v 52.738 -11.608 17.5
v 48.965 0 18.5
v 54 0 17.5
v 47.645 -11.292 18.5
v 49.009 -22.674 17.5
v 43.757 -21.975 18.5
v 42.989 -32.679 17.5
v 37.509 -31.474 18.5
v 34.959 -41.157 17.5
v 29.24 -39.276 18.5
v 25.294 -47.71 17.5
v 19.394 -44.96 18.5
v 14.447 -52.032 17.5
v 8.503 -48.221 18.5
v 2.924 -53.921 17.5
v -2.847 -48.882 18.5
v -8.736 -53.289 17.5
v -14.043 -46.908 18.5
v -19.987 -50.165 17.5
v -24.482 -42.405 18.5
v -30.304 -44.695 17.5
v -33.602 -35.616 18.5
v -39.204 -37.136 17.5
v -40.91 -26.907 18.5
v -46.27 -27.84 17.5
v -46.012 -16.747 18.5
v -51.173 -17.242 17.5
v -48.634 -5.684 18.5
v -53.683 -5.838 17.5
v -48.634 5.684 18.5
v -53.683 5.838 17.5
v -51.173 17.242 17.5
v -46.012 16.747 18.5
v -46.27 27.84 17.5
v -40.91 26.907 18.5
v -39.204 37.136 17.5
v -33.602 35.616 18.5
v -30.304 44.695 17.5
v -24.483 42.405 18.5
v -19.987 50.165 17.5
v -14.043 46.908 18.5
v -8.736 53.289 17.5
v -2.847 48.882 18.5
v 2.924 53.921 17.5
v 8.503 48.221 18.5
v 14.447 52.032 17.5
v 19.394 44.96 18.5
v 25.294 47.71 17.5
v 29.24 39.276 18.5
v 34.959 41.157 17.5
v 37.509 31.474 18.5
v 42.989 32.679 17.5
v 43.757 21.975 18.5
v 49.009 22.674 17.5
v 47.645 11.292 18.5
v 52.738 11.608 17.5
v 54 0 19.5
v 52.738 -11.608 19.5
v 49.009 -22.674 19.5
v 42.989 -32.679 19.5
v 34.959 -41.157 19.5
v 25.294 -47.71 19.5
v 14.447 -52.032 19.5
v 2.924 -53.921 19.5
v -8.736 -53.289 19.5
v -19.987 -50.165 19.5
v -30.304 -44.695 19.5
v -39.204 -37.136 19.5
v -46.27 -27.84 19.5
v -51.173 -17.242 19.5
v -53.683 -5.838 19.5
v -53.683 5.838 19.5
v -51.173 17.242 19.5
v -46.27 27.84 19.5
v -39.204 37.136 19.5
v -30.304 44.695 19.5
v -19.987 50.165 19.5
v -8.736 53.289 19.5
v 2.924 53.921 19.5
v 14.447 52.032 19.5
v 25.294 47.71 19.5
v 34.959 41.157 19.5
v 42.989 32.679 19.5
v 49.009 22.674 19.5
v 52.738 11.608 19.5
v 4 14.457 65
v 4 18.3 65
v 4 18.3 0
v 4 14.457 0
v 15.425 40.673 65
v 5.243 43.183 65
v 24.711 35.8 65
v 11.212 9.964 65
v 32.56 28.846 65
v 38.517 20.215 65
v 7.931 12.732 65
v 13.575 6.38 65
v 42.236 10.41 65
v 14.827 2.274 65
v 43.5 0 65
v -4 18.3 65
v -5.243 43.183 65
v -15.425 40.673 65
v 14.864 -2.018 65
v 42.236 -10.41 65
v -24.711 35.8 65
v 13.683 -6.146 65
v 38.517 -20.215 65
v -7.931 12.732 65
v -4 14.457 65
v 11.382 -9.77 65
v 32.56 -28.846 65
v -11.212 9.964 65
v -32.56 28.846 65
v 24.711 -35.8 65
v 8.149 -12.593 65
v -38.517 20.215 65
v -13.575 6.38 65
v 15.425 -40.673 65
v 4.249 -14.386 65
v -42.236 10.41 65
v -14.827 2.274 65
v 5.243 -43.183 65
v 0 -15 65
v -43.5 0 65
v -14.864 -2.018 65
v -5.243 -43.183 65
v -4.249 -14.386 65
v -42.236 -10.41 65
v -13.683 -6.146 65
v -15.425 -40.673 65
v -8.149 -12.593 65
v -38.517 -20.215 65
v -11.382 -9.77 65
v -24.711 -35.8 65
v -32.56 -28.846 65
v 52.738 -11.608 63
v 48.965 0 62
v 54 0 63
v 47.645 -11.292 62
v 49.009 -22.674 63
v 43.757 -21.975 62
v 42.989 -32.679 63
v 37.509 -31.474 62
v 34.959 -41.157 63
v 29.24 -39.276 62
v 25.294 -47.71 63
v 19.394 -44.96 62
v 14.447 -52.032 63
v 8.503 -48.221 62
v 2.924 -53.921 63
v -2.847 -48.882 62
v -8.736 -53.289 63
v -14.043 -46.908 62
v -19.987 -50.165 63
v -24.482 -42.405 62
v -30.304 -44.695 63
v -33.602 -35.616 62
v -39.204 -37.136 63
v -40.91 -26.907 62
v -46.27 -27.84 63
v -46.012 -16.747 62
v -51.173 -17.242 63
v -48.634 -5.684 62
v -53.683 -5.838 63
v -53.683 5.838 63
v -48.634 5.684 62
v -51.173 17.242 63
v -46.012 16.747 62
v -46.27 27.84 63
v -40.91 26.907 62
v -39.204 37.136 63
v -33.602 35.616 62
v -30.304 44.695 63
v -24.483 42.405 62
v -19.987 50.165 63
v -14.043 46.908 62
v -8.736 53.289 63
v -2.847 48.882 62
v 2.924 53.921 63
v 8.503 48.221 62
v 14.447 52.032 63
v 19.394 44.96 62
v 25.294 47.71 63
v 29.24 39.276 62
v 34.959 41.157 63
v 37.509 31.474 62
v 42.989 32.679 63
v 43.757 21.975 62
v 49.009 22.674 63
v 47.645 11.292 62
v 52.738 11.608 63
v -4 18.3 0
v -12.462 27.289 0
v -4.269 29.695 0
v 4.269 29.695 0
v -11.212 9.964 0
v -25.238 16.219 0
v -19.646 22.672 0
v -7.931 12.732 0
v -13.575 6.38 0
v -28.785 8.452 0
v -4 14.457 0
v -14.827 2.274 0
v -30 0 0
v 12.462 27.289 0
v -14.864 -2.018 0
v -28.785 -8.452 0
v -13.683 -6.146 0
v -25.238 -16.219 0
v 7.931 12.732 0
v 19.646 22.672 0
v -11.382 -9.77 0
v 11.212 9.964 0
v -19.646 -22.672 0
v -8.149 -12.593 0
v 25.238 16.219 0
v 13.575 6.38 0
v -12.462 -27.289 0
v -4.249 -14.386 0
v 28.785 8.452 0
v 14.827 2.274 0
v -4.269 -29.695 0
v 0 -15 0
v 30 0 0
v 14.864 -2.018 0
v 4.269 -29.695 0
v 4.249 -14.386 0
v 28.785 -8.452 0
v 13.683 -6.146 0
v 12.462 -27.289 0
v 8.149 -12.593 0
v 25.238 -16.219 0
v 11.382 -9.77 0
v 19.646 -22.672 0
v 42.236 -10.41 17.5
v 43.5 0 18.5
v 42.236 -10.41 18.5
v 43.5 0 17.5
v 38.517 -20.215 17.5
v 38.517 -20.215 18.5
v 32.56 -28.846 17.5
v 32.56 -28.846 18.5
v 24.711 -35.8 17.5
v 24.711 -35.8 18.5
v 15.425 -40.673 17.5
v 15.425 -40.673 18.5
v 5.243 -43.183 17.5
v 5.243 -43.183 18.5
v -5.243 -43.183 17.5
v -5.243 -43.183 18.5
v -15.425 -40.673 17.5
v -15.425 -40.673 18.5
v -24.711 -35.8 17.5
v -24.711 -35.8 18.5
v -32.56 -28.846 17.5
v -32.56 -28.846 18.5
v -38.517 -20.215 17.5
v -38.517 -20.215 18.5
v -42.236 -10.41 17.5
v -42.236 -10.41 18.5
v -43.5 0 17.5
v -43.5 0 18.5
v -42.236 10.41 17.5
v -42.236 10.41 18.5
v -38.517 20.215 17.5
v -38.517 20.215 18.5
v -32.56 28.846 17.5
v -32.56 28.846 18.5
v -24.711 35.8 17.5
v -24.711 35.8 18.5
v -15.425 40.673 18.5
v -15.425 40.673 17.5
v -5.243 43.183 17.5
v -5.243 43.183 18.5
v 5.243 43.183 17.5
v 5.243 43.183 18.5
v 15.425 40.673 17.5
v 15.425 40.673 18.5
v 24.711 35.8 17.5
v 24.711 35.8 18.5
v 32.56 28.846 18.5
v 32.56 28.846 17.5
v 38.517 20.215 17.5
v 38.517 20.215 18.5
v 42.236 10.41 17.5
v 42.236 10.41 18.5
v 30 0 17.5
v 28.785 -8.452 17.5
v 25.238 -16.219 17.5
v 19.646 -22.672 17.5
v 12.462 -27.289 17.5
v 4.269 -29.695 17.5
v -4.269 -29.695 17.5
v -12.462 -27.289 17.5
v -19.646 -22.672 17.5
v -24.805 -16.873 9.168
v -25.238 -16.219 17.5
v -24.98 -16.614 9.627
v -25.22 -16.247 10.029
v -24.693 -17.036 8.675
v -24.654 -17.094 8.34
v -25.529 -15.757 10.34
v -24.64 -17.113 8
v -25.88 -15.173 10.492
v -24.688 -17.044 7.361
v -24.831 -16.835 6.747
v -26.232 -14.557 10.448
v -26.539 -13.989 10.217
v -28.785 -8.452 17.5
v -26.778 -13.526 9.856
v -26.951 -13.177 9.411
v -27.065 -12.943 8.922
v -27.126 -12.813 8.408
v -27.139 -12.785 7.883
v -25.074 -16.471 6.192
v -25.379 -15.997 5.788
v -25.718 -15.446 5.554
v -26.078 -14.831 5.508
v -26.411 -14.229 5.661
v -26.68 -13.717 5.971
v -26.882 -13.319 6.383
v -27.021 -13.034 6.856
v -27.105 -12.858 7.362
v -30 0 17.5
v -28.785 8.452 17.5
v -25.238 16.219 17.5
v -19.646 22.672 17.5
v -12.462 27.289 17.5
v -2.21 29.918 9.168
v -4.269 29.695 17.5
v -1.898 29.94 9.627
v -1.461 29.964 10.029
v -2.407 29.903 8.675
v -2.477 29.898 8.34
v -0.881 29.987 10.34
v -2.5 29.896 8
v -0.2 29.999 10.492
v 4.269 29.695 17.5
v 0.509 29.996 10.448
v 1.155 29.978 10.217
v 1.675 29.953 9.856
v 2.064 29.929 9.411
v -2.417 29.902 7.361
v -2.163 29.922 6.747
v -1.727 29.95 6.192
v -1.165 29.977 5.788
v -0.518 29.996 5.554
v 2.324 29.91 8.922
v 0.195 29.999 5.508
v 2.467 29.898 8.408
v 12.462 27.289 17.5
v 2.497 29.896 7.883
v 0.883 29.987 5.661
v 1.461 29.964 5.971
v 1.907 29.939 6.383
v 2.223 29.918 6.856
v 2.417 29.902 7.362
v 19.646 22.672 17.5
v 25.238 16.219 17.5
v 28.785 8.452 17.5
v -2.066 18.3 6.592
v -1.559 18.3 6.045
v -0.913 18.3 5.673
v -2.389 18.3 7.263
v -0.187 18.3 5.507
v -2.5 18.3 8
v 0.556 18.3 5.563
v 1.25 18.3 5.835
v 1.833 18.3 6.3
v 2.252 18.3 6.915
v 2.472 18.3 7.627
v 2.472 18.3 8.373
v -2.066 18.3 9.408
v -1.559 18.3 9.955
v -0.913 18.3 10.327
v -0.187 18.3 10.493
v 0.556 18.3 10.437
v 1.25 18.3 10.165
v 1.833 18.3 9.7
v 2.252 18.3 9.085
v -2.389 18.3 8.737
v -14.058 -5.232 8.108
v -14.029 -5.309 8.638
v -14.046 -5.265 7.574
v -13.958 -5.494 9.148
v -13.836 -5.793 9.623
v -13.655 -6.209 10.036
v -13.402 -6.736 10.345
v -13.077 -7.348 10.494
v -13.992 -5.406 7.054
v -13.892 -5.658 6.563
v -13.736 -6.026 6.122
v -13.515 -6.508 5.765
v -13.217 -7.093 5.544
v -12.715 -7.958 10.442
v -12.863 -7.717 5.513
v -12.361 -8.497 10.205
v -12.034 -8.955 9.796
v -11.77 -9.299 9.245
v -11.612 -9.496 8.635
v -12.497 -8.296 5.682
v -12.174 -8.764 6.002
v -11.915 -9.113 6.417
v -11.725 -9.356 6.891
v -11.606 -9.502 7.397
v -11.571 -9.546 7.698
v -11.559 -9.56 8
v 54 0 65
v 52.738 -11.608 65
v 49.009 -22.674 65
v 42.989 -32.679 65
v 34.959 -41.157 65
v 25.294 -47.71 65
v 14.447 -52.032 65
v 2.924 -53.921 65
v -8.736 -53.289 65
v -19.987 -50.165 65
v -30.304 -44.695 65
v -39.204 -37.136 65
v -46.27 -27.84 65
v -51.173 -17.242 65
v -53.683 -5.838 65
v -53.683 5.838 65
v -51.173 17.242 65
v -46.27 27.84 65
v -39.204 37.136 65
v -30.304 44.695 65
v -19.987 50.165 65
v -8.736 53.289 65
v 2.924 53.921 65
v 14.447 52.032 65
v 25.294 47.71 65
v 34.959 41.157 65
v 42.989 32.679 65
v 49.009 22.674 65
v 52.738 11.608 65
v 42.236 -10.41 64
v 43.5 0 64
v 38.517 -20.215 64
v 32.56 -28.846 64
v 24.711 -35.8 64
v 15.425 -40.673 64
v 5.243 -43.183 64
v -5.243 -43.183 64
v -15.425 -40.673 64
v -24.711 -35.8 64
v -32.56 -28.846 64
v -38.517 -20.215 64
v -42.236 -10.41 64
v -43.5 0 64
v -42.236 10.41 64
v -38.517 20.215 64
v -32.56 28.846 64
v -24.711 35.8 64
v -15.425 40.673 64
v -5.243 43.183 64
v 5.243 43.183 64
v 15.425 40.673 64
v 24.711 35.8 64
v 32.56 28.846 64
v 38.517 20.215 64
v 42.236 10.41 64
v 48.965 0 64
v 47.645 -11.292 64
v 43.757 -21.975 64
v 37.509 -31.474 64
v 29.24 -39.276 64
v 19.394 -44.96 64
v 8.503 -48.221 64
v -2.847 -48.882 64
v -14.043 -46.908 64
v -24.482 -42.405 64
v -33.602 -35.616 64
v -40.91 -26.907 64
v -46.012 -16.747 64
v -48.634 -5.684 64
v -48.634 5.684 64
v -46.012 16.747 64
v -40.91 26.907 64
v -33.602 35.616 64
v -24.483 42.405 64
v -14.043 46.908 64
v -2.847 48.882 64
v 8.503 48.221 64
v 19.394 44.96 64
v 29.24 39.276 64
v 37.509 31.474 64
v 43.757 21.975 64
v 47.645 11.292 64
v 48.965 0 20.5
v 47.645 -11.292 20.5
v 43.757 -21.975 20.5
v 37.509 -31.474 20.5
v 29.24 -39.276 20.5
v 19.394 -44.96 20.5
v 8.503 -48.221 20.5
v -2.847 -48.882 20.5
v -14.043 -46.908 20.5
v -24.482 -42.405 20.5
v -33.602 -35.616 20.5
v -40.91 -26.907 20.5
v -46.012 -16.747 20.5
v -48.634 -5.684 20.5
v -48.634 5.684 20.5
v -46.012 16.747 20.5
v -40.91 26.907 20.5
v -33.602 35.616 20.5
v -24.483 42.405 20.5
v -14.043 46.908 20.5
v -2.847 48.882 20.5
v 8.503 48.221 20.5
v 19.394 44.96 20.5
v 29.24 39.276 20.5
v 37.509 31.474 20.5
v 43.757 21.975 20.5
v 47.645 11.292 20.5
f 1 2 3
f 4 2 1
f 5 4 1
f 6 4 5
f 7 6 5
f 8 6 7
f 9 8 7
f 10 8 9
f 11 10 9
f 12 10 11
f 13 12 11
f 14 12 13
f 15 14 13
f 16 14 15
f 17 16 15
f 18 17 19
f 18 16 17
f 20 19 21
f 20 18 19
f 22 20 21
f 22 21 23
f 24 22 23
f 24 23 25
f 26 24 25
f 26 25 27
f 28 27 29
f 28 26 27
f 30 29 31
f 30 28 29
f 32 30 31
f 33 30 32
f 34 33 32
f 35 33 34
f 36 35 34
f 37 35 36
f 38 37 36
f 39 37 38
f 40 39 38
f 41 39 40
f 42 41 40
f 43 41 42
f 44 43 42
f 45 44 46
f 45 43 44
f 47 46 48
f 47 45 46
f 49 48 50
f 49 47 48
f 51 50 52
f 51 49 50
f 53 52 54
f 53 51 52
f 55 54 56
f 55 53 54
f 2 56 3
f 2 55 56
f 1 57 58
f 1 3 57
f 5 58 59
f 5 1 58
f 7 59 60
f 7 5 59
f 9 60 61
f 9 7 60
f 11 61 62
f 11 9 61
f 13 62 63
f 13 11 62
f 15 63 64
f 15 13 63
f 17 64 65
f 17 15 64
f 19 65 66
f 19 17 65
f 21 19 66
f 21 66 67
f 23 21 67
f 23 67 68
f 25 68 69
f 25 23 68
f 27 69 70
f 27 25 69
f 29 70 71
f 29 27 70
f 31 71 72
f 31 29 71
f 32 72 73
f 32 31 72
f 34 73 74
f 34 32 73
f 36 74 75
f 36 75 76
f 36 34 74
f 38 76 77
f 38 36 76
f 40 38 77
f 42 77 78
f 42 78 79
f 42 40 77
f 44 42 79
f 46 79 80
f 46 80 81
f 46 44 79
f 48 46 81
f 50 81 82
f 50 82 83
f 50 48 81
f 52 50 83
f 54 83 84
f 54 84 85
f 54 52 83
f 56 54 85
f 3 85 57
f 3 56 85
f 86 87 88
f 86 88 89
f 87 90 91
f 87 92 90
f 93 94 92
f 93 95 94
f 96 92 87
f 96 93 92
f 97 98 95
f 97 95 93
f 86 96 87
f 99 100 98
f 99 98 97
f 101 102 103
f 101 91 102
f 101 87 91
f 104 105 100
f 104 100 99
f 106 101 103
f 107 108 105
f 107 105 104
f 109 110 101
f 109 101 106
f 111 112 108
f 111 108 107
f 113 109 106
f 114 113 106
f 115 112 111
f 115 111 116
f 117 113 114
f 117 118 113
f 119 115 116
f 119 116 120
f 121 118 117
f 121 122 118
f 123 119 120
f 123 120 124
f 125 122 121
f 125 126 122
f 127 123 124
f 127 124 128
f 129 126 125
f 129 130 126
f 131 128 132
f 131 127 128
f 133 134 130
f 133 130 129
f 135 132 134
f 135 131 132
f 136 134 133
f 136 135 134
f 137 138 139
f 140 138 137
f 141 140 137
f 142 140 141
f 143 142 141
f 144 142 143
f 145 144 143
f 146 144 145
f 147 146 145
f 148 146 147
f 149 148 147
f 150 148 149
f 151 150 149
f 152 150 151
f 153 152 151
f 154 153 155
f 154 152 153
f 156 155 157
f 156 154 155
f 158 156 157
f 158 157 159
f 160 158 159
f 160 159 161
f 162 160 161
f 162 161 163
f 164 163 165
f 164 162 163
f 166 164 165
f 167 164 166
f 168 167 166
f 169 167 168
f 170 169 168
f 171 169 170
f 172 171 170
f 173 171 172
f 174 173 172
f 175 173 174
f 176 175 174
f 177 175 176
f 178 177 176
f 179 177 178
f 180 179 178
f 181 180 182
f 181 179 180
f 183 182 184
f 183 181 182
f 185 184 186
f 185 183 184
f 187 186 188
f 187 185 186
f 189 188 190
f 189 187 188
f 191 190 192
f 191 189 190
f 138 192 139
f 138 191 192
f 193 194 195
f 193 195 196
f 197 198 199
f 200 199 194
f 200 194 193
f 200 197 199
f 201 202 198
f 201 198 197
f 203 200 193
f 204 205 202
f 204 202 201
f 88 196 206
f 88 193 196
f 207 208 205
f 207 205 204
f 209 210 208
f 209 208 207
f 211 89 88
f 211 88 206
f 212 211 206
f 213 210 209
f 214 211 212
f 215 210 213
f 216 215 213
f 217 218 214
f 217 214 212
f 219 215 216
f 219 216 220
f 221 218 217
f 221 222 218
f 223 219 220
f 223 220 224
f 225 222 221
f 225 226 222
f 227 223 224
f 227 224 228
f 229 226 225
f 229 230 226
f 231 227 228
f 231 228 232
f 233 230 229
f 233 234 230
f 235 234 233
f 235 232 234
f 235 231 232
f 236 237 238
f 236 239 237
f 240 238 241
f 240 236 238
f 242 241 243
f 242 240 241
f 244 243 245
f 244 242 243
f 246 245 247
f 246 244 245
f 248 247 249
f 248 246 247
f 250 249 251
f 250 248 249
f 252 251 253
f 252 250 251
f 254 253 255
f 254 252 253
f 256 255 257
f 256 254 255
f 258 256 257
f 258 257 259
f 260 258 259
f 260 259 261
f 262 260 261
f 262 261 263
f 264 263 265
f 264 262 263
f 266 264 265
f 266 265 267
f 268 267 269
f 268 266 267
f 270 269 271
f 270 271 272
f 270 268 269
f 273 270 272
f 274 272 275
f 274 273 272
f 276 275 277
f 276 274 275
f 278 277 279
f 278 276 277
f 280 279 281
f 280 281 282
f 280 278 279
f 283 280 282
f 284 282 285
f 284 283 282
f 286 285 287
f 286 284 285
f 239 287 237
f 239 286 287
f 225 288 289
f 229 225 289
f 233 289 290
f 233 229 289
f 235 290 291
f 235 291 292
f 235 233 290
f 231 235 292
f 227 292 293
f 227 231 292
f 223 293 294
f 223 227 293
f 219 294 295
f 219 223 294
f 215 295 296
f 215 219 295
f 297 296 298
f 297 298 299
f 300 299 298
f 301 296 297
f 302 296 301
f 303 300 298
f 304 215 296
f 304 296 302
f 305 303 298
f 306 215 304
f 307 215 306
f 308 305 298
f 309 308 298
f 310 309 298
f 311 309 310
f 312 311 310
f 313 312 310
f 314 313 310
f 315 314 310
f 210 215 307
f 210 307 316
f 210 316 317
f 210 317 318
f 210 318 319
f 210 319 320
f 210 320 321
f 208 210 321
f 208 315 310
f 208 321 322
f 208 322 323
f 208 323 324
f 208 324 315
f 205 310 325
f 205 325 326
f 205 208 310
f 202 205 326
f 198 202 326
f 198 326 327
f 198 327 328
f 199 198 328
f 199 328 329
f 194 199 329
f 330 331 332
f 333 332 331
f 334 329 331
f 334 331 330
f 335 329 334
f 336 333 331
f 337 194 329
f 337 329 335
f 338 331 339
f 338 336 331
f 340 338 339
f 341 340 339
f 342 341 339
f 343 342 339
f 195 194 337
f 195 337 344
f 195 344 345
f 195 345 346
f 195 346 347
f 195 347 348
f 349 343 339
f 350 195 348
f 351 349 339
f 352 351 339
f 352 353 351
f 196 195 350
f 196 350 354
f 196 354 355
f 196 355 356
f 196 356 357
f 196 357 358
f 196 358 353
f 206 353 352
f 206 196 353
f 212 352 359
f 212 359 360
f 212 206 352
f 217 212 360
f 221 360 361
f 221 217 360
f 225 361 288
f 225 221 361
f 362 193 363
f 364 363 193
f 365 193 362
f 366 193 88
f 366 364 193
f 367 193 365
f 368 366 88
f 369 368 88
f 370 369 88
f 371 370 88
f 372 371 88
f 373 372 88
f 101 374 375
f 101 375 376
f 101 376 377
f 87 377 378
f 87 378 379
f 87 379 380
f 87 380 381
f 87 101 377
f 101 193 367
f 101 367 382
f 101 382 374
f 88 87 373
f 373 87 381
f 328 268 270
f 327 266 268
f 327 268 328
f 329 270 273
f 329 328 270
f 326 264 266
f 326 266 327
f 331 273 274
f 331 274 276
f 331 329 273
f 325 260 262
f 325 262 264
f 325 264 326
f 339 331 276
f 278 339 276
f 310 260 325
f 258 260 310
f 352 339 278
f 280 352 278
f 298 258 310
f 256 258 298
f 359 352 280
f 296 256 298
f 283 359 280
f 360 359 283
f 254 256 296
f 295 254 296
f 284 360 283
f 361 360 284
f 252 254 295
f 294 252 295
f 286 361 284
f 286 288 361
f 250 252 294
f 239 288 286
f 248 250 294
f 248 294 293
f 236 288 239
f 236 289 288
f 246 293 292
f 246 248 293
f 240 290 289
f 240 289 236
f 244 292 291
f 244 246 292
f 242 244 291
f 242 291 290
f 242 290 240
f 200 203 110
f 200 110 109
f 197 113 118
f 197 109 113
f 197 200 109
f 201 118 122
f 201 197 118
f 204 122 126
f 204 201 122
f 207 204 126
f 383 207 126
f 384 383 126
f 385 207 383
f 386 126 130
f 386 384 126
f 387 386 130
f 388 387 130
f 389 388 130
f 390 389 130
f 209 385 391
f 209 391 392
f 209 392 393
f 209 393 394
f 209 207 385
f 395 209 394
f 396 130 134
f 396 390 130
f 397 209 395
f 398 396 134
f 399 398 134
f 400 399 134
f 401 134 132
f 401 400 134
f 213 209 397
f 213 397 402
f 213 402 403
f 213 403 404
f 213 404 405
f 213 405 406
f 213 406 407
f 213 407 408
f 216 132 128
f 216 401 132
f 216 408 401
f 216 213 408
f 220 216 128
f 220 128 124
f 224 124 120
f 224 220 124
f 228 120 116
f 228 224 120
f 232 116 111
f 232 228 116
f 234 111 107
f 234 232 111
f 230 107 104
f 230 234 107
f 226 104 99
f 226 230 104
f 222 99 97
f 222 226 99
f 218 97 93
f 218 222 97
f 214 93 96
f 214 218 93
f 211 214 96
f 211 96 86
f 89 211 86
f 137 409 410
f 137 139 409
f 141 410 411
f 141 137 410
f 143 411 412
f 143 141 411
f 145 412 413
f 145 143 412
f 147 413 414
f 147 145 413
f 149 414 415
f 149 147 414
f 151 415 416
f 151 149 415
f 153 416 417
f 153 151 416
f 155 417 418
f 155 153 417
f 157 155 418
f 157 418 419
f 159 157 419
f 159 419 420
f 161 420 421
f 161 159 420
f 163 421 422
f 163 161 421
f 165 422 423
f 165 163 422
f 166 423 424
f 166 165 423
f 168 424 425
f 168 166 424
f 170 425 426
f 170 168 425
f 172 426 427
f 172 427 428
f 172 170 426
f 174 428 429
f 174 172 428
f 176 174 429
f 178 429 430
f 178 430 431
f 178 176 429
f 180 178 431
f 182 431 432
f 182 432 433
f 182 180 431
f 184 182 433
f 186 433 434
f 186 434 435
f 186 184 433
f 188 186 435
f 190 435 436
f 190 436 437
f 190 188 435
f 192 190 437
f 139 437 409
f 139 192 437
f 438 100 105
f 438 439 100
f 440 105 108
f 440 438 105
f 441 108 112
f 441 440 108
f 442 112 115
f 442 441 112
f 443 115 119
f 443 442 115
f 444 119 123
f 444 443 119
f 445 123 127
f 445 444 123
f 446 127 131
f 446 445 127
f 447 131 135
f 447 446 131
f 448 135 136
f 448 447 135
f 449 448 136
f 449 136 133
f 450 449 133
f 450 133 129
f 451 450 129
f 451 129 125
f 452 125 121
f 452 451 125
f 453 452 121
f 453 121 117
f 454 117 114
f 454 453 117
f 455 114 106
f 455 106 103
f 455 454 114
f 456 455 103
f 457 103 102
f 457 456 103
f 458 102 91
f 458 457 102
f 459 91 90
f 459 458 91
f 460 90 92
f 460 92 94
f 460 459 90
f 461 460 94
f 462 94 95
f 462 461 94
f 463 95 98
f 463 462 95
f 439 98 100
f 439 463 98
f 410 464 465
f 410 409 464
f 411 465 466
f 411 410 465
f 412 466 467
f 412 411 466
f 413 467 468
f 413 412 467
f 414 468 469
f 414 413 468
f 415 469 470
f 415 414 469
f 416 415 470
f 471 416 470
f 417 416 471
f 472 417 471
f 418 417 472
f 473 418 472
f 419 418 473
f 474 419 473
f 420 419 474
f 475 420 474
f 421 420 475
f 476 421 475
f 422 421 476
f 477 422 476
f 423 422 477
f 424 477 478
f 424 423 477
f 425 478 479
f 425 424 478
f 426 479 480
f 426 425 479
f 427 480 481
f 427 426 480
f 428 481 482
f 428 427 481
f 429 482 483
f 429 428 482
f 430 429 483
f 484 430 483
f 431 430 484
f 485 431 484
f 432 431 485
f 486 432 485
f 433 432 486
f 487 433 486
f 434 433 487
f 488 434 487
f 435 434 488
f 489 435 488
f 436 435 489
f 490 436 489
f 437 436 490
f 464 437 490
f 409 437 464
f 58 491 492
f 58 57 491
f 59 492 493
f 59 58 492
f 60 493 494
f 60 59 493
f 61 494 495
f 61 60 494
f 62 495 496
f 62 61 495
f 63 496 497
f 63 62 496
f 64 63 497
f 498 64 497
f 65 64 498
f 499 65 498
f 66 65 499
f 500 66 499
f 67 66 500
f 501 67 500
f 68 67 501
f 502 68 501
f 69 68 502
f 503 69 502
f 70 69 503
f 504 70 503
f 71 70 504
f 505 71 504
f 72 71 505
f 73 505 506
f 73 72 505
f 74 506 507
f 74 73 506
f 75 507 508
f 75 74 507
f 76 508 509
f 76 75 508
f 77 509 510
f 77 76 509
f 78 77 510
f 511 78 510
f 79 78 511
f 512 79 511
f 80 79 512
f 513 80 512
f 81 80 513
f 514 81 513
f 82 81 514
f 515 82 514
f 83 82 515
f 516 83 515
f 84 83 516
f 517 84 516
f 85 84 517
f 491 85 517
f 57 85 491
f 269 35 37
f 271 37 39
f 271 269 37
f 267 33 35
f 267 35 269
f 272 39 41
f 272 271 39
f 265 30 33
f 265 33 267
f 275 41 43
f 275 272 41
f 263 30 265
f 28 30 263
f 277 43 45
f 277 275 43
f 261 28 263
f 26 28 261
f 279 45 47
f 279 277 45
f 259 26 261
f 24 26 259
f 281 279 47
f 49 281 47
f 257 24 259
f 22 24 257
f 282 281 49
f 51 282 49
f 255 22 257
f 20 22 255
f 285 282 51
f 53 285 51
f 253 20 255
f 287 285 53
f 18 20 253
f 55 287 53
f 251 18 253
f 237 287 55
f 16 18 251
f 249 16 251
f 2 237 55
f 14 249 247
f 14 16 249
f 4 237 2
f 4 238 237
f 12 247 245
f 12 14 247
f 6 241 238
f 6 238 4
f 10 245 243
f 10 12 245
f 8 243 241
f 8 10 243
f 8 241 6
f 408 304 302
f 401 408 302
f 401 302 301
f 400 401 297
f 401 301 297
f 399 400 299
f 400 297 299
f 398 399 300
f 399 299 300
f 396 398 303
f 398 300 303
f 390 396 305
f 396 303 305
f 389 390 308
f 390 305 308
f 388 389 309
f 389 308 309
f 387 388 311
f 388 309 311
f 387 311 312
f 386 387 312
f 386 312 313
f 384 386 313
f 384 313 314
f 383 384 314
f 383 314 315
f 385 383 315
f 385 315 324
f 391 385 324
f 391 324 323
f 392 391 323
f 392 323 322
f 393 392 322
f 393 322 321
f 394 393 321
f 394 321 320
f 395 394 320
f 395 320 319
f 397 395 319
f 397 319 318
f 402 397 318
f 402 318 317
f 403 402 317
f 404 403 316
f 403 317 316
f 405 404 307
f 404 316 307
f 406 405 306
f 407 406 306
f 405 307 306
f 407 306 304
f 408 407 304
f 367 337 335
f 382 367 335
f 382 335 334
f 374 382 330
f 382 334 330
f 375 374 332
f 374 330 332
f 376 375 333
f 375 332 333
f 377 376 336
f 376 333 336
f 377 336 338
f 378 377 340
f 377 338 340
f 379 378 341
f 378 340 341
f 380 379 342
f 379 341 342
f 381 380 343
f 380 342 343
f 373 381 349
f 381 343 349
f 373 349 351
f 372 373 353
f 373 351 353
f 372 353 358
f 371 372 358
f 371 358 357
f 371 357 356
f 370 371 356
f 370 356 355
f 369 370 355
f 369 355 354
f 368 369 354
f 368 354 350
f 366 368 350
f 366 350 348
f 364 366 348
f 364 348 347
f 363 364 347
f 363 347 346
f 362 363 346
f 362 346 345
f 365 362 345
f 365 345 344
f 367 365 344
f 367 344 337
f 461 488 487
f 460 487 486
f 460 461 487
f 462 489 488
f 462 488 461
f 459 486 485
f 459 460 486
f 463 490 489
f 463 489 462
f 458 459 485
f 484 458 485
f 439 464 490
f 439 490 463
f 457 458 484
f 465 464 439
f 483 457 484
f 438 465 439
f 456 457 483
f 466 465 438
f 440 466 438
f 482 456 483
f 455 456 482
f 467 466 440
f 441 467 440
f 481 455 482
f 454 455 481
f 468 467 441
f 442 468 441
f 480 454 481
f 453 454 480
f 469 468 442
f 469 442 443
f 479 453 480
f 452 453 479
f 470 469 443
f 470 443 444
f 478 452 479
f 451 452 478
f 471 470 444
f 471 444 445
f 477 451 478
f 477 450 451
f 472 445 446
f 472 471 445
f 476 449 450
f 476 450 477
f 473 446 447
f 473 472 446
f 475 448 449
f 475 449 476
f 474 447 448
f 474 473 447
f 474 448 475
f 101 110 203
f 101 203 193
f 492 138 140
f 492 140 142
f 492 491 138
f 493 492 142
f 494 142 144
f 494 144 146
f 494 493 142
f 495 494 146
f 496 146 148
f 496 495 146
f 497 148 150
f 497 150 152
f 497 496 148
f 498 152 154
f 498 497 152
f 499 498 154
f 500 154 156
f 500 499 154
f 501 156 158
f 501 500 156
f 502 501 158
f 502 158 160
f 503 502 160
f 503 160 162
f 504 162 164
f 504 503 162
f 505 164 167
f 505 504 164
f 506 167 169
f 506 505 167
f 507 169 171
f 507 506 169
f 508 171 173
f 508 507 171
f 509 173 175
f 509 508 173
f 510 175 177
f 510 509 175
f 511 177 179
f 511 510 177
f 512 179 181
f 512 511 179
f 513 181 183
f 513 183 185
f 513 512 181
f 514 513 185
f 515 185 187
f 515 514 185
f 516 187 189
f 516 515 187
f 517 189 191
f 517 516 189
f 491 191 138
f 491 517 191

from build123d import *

# Parameters (mm, degrees)
SKETCH2_W                  = 65
SKETCH2_H                  = 15
CUT_EXTRUDE1_DEPTH         = 101.284595028
M6X1_0_TAPPED_HOLE1_REACH  = 147.812
M6X1_0_TAPPED_HOLE1_BORE_R = 2.5
CIRPATTERN1_COUNT          = 2
CIRPATTERN1_ANGLE          = 120


with BuildPart() as part:
    # Sketch1 → Revolve1 (revolve)
    with BuildSketch(Plane(origin=(0, 0, 0), x_dir=(0, 0, -1), z_dir=(1, 0, 0)), mode=Mode.PRIVATE) as revolve1_sk:
        Polygon((-65, 43.5), (-64, 43.5), (-64, 48.965), (-65, 54), (-63, 54), (-62, 48.965), (-20.5, 48.965), (-19.5, 54), (-17.5, 54), (-18.5, 48.965), (-18.5, 43.5), (-17.5, 43.5), (-17.5, 30), (0, 30), (0, 0), (-65, 0), align=None)
    revolve(revolve1_sk.sketch.rotate(Axis((0, 0, 66.142918398), (0, 0, -1)), 90), axis=Axis((0, 0, 66.142918398), (0, 0, -1)))

    # Sketch2 → Cut-Revolve1 (revolve, cut)
    with BuildSketch(Plane(origin=(0, 0, 0), x_dir=(0, 0, -1), z_dir=(1, 0, 0)), mode=Mode.PRIVATE) as cut_revolve1_sk:
        with Locations((-32.5, 7.5)):
            Rectangle(SKETCH2_W, SKETCH2_H)
    revolve(cut_revolve1_sk.sketch.rotate(Axis((0, 0, -15.356501925), (0, 0, 1)), 90), axis=Axis((0, 0, -15.356501925), (0, 0, 1)), mode=Mode.SUBTRACT)

    # Sketch3 → Cut-Extrude1 (cut, through all)
    with BuildSketch(Plane.XY.offset(65)):
        with BuildLine():
            Line((-4, 18.3), (4, 18.3))
            Line((4, 18.3), (4, 14.456832295))
            ThreePointArc((4, 14.456832295), (0, 15), (-4, 14.456832295))
            Line((-4, 14.456832295), (-4, 18.3))
        make_face()
    extrude(amount=-CUT_EXTRUDE1_DEPTH, mode=Mode.SUBTRACT)

    # M6x1.0 Tapped Hole1 bore → M6x1.0 Tapped Hole1 (cut, up to next)
    with BuildSketch(Plane(origin=(0, 30, -41.25), x_dir=(-1, 0, 0), z_dir=(0, 1, 0)), mode=Mode.PRIVATE) as m6x1_0_tapped_hole1_sk1:
        with Locations((0, 49.25)):
            Circle(M6X1_0_TAPPED_HOLE1_BORE_R)
    m6x1_0_tapped_hole1_tool1 = extrude(m6x1_0_tapped_hole1_sk1.sketch, amount=-M6X1_0_TAPPED_HOLE1_REACH, mode=Mode.PRIVATE) & part.part
    m6x1_0_tapped_hole1 = m6x1_0_tapped_hole1_tool1.solids().sort_by_distance((0, 30, 8))[0]
    add(m6x1_0_tapped_hole1, mode=Mode.SUBTRACT)

    # CirPattern1: M6x1.0 Tapped Hole1; each copy of M6x1.0 Tapped Hole1 runs up to whatever stops it at its own place
    cirpattern1_before = part.part  # the part as the pattern finds it: every copy runs up to it
    cirpattern1_m6x1_0_tapped_hole1_long = extrude(m6x1_0_tapped_hole1_sk1.sketch, amount=-M6X1_0_TAPPED_HOLE1_REACH, mode=Mode.PRIVATE)
    cirpattern1_m6x1_0_tapped_hole1_tool1 = cirpattern1_m6x1_0_tapped_hole1_long.rotate(Axis((0, 0, -15.356501925), (0, 0, 1)), 1 * CIRPATTERN1_ANGLE / (CIRPATTERN1_COUNT - 1)) & cirpattern1_before
    add(cirpattern1_m6x1_0_tapped_hole1_tool1.solids().sort_by_distance((-25.980762, -15, 8))[0], mode=Mode.SUBTRACT)


solid = part.part
